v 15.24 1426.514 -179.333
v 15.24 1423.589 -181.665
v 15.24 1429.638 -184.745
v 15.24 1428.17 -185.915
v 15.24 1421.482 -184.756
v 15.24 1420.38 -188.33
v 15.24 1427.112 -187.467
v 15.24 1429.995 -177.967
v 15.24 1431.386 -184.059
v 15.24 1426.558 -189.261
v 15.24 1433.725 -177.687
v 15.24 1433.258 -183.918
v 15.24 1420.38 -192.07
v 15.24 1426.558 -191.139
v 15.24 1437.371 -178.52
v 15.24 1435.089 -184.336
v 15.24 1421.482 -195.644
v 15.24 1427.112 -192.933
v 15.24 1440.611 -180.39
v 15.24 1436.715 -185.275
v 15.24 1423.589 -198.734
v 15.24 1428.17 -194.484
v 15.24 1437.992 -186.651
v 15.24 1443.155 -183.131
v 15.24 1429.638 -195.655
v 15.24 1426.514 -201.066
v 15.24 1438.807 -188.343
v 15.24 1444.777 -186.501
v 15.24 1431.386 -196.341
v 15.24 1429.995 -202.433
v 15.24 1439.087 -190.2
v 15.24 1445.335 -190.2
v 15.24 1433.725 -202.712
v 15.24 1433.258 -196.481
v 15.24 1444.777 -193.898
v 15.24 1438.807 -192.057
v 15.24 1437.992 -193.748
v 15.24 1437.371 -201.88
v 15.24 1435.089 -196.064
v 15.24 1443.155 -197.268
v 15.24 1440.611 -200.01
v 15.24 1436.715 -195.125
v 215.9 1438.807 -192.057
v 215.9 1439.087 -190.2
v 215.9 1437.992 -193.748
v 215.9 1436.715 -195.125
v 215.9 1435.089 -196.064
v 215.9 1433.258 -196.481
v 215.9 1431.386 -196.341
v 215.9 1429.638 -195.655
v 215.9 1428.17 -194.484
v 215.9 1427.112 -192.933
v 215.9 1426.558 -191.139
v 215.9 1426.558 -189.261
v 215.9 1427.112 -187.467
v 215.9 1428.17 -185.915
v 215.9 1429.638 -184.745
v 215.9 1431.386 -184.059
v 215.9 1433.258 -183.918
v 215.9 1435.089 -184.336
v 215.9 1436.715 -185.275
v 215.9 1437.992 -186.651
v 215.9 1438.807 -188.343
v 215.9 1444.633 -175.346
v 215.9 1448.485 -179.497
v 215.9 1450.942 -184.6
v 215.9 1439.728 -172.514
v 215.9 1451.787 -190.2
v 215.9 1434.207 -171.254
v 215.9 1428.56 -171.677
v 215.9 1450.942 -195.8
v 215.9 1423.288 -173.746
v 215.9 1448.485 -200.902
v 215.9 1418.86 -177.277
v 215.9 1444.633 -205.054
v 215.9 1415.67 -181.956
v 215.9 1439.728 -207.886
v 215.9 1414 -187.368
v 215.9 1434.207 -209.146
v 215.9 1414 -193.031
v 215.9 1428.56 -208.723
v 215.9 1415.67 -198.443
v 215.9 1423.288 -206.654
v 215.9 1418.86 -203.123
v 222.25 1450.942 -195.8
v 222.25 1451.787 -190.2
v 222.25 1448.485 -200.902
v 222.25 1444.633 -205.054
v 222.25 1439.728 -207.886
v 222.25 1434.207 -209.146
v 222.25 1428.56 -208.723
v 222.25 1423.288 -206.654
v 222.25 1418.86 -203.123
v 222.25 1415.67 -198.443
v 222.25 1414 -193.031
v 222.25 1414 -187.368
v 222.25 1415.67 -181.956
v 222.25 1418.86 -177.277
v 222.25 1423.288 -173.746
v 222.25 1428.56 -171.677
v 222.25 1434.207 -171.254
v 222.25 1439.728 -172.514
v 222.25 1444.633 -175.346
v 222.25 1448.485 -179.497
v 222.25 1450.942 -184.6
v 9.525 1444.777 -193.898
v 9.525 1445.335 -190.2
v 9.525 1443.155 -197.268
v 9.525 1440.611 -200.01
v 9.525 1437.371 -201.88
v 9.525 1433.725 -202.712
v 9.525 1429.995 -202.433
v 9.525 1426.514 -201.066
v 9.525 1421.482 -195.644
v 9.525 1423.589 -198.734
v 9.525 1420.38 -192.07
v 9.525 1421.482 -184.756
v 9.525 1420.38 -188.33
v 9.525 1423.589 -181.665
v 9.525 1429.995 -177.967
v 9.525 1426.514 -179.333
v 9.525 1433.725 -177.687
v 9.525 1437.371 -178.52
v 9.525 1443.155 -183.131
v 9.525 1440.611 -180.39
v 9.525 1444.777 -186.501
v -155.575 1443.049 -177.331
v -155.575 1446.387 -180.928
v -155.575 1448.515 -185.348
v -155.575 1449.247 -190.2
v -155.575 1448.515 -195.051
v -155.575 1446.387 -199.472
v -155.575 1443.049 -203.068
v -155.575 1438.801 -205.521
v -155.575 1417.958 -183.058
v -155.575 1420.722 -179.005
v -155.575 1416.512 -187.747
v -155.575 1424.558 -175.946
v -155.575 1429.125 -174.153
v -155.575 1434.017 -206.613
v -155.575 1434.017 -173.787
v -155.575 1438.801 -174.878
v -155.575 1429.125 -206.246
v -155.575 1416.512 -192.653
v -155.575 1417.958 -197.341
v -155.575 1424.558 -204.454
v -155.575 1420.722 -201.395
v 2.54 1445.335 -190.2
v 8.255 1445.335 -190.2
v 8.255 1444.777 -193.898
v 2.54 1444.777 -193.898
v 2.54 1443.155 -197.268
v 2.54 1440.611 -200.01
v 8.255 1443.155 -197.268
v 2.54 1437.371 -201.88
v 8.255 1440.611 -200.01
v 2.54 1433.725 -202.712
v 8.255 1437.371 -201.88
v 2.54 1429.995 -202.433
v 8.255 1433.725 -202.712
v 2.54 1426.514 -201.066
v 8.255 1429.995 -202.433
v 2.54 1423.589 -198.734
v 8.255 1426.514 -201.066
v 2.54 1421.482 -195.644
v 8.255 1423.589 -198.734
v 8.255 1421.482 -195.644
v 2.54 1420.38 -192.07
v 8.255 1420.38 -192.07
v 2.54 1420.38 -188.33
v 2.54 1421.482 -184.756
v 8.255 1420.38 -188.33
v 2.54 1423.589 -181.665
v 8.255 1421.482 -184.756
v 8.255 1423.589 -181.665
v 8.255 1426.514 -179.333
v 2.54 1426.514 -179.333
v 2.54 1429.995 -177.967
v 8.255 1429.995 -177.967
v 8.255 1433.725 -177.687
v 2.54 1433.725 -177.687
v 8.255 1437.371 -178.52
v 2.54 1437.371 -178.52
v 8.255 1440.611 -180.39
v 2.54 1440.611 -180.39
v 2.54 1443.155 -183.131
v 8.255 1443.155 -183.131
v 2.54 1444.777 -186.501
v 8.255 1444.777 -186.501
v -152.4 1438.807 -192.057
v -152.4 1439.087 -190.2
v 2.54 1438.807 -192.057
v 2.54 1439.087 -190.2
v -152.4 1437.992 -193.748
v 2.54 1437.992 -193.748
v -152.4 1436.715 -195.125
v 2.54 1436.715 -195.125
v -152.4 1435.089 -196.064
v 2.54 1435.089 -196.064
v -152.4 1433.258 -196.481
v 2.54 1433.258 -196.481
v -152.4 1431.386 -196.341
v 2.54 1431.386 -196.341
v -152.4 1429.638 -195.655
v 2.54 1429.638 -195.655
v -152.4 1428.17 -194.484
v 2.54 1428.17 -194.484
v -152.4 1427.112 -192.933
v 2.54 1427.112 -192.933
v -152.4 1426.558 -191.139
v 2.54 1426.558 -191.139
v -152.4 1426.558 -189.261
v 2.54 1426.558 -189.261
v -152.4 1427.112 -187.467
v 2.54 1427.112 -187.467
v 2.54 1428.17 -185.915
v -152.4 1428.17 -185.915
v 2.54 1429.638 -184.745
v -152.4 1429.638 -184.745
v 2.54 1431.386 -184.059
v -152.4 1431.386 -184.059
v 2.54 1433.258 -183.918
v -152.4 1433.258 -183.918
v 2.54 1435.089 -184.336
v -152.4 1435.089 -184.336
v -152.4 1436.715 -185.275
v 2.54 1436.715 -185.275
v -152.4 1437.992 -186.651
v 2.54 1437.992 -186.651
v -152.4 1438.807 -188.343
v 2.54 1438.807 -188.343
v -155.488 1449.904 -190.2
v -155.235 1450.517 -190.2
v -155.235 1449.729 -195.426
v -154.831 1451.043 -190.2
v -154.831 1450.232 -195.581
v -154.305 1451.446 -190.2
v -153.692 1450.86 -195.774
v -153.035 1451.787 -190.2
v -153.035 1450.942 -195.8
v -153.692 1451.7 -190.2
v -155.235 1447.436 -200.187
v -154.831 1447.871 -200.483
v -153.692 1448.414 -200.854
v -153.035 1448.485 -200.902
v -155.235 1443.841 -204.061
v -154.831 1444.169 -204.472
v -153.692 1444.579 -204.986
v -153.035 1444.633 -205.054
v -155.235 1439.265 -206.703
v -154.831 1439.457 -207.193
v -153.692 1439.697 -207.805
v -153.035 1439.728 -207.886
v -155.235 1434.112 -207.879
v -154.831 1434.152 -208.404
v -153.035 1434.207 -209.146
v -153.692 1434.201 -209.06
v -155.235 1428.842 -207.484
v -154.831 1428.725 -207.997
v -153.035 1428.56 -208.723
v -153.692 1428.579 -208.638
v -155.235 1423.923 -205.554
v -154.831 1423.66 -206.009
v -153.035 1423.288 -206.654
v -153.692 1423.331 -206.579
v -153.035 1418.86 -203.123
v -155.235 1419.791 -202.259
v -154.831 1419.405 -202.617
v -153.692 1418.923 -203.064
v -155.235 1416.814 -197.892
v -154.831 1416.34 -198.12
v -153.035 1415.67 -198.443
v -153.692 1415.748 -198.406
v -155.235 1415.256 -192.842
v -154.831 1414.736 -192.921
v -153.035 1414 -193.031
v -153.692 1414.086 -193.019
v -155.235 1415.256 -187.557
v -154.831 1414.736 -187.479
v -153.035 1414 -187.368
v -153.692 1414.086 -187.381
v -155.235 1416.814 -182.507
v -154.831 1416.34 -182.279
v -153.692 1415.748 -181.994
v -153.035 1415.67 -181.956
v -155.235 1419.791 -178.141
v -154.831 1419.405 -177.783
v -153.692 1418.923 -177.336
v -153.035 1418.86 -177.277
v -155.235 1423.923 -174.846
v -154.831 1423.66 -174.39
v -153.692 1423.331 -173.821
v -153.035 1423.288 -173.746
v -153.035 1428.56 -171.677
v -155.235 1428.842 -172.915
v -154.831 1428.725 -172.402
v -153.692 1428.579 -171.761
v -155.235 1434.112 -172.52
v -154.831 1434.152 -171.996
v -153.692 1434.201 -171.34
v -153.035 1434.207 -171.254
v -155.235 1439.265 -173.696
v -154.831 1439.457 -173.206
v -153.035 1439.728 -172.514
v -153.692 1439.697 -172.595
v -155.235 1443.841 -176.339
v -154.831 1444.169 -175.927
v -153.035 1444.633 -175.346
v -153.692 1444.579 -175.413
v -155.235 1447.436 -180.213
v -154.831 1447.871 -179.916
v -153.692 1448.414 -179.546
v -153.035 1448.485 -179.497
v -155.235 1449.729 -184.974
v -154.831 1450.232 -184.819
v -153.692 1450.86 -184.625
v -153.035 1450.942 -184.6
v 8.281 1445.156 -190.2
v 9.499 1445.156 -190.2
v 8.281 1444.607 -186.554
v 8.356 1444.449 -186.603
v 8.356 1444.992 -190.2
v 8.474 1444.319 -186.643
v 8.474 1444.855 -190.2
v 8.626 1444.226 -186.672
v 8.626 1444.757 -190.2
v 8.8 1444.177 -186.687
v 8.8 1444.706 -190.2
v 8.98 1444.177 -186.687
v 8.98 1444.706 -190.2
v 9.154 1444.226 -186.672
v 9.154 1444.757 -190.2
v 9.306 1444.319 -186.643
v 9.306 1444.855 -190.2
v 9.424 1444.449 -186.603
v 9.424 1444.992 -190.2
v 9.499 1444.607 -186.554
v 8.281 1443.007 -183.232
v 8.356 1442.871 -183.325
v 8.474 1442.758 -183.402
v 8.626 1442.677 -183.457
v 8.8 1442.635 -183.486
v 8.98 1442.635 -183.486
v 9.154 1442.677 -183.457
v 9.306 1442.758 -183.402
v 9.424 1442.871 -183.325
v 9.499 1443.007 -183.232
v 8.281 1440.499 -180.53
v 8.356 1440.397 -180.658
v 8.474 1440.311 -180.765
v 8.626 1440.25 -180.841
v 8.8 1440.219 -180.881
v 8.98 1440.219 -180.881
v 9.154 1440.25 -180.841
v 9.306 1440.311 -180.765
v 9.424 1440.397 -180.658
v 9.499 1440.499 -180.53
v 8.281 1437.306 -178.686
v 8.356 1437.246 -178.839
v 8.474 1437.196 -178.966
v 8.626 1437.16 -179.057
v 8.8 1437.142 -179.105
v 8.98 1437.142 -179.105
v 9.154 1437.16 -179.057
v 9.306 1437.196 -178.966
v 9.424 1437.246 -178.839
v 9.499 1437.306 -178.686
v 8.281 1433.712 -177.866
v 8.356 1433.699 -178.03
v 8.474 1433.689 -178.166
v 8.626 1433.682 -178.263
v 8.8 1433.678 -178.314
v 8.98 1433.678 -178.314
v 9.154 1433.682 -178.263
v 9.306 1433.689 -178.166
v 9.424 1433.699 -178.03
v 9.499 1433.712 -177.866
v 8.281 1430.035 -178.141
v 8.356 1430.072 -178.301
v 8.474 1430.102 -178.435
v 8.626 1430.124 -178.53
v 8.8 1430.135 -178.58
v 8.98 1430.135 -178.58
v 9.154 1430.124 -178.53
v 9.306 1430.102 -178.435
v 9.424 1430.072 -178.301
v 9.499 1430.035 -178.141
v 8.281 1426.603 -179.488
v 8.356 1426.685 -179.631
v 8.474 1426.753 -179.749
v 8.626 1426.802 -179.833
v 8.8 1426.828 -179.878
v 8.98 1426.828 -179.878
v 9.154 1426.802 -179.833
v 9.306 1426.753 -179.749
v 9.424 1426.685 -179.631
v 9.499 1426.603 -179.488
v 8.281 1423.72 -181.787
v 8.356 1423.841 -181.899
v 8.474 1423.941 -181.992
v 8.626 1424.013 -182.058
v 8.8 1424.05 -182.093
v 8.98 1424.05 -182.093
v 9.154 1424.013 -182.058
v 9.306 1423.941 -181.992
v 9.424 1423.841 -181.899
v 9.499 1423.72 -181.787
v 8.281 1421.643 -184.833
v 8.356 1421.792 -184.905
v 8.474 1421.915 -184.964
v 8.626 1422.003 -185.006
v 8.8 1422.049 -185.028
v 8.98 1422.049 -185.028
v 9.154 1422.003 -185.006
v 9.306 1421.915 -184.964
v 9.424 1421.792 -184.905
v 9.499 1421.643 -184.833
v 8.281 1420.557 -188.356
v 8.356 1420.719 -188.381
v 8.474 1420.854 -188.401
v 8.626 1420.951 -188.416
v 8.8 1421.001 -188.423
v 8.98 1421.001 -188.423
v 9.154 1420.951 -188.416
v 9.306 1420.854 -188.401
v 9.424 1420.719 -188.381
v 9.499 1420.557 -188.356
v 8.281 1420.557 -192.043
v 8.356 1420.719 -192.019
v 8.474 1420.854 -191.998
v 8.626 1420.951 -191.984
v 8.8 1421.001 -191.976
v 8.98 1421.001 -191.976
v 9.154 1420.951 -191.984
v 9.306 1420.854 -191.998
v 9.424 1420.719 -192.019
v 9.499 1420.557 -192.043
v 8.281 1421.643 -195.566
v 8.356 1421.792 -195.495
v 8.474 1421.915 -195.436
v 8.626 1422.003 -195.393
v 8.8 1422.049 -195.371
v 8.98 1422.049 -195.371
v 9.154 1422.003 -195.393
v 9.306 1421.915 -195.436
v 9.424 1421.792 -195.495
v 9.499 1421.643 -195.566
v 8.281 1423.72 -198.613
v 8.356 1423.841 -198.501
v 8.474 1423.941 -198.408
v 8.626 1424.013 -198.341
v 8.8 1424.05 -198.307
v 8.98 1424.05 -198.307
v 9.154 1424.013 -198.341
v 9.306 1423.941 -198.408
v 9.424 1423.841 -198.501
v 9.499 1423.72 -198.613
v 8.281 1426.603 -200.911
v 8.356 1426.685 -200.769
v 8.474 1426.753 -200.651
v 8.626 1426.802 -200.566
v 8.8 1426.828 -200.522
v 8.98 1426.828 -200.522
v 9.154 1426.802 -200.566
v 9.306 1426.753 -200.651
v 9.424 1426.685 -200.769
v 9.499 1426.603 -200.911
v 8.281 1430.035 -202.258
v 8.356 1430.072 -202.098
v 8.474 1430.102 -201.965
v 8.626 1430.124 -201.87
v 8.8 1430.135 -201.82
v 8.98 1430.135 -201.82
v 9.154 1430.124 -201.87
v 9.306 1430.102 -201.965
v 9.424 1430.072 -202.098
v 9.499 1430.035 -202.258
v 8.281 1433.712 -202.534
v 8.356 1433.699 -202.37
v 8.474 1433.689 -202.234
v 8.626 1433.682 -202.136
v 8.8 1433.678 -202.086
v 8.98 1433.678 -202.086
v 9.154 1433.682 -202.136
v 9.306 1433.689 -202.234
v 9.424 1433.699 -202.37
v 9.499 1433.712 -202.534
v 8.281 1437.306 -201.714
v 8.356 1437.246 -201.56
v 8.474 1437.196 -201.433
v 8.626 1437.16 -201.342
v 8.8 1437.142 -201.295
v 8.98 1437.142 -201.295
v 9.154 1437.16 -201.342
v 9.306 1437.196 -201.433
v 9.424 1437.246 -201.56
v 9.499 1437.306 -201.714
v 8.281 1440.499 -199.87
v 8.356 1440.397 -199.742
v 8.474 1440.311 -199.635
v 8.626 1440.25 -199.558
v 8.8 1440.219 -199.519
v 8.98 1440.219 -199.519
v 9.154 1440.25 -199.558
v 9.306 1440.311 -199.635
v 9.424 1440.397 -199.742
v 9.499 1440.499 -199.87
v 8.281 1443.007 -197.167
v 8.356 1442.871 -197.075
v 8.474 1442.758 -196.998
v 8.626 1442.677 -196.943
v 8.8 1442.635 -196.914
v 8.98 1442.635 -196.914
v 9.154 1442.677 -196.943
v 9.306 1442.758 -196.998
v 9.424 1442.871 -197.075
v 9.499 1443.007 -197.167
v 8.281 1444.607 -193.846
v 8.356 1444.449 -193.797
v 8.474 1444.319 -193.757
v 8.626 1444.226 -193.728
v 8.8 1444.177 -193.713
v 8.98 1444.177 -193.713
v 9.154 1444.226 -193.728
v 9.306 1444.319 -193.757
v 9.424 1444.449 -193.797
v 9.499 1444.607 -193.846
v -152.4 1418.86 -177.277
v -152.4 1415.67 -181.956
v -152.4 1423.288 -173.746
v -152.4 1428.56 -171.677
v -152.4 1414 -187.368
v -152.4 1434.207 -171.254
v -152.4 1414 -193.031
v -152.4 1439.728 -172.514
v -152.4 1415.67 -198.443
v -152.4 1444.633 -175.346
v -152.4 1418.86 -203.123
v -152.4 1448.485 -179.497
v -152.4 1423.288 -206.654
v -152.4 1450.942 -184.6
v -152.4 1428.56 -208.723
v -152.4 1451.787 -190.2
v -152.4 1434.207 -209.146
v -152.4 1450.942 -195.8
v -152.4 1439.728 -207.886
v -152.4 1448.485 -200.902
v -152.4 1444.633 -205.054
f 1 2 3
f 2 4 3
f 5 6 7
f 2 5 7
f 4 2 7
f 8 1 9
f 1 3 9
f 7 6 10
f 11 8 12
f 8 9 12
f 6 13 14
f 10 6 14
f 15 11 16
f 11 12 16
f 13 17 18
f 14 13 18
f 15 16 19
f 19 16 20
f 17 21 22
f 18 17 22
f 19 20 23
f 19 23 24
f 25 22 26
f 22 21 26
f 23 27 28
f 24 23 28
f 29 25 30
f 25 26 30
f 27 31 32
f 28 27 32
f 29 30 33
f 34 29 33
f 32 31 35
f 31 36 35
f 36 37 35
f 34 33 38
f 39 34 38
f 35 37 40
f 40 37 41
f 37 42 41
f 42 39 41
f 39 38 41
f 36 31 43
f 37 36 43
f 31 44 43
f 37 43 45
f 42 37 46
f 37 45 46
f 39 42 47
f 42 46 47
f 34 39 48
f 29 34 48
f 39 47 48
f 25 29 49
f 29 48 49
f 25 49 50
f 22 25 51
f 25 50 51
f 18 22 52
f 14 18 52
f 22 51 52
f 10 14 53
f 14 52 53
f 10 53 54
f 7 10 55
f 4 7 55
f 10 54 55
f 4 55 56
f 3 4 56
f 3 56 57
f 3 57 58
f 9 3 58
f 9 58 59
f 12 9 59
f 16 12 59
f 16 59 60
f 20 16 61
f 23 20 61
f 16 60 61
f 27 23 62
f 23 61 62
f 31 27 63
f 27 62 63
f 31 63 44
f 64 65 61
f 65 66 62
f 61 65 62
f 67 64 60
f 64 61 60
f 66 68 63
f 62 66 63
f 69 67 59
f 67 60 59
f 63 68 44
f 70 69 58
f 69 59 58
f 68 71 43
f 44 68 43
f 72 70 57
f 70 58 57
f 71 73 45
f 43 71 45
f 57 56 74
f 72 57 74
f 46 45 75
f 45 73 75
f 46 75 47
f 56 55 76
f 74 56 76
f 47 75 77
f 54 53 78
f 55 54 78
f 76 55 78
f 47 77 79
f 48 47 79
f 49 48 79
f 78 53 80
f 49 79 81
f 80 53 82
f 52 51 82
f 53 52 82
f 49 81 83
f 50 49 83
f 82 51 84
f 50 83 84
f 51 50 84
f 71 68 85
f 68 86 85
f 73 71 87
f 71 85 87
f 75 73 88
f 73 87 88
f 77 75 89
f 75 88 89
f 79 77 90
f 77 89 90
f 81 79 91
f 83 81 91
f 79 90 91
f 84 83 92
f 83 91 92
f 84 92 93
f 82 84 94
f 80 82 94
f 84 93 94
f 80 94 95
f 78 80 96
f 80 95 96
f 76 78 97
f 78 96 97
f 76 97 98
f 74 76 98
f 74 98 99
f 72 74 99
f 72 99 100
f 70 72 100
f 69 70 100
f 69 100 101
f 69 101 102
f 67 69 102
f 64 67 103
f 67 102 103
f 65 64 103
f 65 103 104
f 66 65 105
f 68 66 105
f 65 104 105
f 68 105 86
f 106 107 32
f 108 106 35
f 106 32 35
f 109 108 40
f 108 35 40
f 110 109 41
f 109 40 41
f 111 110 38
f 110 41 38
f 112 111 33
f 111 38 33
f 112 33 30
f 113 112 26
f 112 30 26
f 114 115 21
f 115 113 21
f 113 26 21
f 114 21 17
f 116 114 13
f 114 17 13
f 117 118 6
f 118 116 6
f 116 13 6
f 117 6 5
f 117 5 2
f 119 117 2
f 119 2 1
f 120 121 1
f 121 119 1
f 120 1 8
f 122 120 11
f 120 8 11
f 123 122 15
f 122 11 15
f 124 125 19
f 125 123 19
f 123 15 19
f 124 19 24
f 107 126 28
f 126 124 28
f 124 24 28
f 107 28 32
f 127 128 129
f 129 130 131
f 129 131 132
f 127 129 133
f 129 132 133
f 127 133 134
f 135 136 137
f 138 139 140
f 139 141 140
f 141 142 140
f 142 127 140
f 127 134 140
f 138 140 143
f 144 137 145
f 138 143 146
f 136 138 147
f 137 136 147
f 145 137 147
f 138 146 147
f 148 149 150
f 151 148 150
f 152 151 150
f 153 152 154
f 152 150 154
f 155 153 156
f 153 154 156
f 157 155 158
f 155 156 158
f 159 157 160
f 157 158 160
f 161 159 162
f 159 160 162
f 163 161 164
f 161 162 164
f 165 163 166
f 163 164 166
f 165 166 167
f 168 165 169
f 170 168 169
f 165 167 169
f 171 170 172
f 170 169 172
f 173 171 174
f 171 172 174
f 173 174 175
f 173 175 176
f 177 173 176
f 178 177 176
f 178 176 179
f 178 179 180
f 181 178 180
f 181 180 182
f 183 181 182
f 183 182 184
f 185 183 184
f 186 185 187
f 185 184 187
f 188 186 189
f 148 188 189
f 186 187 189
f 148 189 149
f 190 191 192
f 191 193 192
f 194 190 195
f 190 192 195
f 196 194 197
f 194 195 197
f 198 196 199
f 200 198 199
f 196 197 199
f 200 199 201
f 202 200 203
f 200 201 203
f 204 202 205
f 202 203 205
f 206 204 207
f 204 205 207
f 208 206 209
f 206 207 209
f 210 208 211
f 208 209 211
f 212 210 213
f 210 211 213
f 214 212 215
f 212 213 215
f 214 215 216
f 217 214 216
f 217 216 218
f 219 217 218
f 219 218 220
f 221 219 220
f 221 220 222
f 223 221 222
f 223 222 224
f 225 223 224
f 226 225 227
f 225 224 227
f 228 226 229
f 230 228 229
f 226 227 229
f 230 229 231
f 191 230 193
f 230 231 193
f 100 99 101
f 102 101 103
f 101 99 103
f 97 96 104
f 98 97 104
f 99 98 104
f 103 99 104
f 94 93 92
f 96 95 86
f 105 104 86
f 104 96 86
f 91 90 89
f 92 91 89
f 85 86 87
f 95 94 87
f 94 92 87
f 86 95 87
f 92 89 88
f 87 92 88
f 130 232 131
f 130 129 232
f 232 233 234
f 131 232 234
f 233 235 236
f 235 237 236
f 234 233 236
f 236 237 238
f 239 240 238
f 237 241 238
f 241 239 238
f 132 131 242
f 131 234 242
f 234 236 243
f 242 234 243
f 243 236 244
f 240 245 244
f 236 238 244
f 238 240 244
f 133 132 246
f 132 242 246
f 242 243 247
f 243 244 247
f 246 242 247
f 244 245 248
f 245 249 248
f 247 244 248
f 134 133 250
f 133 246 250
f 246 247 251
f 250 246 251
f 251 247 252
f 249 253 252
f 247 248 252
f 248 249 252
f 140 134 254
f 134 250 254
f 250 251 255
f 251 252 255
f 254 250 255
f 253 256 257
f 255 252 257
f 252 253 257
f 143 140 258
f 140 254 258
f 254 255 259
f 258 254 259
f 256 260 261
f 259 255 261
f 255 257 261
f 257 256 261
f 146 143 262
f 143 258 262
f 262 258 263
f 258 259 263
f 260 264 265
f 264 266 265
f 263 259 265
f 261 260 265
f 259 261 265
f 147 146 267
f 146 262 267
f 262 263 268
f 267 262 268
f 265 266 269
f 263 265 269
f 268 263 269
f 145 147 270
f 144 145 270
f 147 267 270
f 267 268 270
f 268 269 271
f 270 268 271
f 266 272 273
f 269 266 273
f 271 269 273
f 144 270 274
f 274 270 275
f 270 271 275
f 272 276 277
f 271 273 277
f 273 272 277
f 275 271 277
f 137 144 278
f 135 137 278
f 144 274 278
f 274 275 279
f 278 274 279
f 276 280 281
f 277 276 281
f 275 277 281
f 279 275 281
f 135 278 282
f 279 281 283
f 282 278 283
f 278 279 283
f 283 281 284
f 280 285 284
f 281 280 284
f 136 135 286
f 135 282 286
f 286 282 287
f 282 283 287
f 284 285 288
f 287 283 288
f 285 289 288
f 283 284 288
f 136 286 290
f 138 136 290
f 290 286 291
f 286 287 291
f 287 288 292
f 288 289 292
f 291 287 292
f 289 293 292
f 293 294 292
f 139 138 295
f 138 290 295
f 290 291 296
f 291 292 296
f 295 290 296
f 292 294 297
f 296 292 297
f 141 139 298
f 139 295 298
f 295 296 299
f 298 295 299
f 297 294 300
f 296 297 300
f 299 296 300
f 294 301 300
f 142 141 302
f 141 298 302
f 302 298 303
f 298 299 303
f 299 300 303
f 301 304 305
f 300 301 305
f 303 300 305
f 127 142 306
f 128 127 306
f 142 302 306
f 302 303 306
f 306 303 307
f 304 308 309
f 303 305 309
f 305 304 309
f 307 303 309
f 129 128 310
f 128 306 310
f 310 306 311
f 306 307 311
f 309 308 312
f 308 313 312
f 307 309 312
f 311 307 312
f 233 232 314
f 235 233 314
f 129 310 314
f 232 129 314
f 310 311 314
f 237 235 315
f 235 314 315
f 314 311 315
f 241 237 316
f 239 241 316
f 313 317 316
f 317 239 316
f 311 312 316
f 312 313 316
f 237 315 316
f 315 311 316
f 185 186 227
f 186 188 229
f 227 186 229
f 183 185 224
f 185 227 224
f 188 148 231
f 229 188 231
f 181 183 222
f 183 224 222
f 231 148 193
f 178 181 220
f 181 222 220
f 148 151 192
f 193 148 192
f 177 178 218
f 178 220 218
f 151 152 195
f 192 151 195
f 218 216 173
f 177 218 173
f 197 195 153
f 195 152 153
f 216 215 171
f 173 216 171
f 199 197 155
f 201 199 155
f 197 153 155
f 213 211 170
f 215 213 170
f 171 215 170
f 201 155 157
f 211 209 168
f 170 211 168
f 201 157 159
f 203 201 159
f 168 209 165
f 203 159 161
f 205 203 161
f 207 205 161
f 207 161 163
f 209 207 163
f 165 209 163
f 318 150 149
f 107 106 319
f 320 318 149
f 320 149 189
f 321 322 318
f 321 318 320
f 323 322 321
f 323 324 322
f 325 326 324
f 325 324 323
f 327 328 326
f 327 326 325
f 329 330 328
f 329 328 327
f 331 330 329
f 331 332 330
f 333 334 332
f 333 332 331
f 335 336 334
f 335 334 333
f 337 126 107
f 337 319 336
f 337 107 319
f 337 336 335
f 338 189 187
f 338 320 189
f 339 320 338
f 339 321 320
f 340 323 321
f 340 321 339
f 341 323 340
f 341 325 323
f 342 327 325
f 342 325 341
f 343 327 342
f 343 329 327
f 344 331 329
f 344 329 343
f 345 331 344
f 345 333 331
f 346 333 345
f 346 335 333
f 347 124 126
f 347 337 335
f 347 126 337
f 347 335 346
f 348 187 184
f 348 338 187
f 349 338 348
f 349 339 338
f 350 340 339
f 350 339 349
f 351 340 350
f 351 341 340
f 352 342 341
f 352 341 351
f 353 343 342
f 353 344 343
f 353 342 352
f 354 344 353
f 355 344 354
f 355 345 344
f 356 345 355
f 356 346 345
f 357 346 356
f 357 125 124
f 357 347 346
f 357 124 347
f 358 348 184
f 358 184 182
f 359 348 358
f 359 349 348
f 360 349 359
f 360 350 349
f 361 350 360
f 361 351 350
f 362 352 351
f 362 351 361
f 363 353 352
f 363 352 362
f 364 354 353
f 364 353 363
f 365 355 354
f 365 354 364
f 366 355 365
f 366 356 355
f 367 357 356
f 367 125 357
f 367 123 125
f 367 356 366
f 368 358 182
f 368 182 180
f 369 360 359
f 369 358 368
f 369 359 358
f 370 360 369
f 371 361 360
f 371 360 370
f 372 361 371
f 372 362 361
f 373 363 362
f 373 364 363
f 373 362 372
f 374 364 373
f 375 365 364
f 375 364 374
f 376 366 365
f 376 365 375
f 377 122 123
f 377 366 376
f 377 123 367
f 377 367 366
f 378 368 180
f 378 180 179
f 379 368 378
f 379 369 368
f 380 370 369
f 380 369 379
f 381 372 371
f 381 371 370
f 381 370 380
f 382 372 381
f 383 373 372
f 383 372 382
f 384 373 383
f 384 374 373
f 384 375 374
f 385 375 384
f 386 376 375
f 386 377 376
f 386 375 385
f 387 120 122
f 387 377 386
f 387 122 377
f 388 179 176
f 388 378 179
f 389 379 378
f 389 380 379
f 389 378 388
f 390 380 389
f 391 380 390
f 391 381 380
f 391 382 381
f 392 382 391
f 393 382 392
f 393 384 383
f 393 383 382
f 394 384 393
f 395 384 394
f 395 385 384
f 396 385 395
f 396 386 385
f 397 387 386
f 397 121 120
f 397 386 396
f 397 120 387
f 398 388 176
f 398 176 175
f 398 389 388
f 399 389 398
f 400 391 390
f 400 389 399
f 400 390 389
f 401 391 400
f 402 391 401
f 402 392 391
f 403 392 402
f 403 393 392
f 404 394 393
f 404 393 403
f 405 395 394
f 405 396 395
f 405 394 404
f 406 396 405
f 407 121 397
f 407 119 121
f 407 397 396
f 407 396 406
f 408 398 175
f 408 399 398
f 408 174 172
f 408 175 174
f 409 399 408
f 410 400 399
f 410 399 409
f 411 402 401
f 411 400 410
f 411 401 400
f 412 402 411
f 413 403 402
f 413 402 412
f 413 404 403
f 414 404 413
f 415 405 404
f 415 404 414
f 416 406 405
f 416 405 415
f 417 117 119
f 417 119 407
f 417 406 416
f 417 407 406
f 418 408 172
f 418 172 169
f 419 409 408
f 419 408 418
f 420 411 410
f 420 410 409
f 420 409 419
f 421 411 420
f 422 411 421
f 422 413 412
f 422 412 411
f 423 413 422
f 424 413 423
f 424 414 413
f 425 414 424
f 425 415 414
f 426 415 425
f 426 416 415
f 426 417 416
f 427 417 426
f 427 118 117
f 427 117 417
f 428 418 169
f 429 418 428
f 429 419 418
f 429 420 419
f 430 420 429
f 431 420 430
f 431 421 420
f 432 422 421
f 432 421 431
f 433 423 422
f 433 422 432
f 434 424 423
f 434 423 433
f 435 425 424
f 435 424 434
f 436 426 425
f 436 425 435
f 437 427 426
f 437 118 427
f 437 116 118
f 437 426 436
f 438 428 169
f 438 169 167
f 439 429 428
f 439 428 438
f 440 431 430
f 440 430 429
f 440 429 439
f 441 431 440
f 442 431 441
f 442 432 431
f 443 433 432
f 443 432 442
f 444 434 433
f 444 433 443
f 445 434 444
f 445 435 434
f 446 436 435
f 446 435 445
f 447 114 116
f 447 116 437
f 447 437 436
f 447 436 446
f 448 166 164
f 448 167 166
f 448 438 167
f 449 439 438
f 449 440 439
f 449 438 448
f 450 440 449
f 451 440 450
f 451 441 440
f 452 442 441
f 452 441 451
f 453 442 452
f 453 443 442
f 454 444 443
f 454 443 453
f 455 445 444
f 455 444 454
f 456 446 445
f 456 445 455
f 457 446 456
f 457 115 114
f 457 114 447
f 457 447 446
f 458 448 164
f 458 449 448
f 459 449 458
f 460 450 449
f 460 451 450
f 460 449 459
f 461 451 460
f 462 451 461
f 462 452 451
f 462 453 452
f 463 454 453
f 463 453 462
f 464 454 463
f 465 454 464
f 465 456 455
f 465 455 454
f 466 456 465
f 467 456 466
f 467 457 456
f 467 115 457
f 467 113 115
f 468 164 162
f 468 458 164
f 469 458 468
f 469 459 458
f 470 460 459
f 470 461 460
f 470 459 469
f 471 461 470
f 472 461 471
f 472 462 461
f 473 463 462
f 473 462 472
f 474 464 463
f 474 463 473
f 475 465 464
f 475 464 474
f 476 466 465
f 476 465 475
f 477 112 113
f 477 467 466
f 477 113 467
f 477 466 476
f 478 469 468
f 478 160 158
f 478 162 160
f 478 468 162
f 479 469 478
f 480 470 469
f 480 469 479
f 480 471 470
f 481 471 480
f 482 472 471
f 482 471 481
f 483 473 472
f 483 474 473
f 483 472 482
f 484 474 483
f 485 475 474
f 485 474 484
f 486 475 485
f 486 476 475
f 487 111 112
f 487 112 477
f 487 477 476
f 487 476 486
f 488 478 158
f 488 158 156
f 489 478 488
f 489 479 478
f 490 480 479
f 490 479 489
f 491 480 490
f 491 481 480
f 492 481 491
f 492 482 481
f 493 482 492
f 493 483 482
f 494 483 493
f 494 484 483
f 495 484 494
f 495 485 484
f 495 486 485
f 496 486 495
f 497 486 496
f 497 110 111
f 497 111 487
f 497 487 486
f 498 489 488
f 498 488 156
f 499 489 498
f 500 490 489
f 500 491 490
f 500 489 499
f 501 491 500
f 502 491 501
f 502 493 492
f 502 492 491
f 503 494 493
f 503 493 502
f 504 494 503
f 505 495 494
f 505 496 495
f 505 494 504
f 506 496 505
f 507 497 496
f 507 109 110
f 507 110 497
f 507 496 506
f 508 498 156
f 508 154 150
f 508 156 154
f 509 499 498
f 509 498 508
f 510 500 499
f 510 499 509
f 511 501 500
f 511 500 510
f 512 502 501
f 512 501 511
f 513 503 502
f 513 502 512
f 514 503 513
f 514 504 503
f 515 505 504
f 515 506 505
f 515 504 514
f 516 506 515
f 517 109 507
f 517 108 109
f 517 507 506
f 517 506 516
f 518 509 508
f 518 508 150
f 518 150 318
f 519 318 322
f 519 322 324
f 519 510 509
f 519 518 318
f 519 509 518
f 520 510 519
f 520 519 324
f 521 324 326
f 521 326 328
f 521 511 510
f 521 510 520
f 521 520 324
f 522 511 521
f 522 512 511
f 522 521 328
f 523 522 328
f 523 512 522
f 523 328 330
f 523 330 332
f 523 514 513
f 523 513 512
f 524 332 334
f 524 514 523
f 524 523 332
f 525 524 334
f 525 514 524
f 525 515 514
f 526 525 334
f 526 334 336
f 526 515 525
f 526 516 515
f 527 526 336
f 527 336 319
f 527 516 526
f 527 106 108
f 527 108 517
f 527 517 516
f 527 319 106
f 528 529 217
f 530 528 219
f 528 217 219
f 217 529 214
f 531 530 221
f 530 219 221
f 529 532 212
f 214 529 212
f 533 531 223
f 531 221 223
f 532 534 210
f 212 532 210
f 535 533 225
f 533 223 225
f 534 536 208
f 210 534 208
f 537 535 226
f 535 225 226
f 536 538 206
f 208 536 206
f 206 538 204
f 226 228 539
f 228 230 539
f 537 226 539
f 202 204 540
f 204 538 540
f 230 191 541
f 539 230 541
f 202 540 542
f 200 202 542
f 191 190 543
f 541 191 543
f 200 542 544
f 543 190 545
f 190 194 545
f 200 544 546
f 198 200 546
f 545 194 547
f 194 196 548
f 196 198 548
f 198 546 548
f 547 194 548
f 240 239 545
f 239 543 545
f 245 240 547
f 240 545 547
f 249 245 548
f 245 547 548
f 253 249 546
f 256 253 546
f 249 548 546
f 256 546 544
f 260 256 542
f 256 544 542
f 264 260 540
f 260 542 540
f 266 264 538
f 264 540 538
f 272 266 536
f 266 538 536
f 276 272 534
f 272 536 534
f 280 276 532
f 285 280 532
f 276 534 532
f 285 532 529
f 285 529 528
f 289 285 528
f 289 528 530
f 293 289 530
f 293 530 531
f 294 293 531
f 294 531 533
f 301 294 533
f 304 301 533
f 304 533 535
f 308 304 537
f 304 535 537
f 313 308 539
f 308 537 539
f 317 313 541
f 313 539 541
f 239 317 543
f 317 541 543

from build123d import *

# Parameters (mm, degrees)
SKETCH3_R = 0.635


with BuildPart() as part:
    # Sketch2 → Revolve1 (revolve)
    with BuildSketch(Plane(origin=(25.4, 0, -190.199803954), x_dir=(1, 0, 0), z_dir=(0, 0, 1))):
        with BuildLine():
            Line((-10.16, 1439.086510137), (114.3, 1439.086510137))
            Line((114.3, 1439.086510137), (190.5, 1439.086510137))
            Line((190.5, 1439.086510137), (190.5, 1451.786510137))
            Line((190.5, 1451.786510137), (196.85, 1451.786510137))
            Line((196.85, 1451.786510137), (196.85, 1432.787310137))
            Line((196.85, 1432.787310137), (-180.975, 1432.787310137))
            Line((-180.975, 1432.787310137), (-180.975, 1449.246510137))
            ThreePointArc((-180.975, 1449.246510137), (-180.231051224, 1451.042561361), (-178.435, 1451.786510137))
            Line((-178.435, 1451.786510137), (-177.8, 1451.786510137))
            Line((-177.8, 1451.786510137), (-177.8, 1439.086510137))
            Line((-177.8, 1439.086510137), (-101.6, 1439.086510137))
            Line((-101.6, 1439.086510137), (-91.44, 1439.086510137))
            Line((-91.44, 1439.086510137), (-22.86, 1439.086510137))
            Line((-22.86, 1439.086510137), (-22.86, 1445.334910137))
            Line((-22.86, 1445.334910137), (-10.16, 1445.334910137))
            Line((-10.16, 1445.334910137), (-10.16, 1439.086510137))
        make_face()
    revolve(axis=Axis((25.4, 1432.787310137, -190.199803954), (-1, 0, 0)))

    # Sketch3 → Cut-Revolve1 (revolve, cut)
    with BuildSketch(Plane(origin=(25.4, 0, -190.199803954), x_dir=(1, 0, 0), z_dir=(0, 0, 1))):
        with Locations((-16.51, 1445.334910137)):
            Circle(SKETCH3_R)
    revolve(axis=Axis((2.54, 1432.787310137, -190.199803954), (1, 0, 0)), mode=Mode.SUBTRACT)


solid = part.part
